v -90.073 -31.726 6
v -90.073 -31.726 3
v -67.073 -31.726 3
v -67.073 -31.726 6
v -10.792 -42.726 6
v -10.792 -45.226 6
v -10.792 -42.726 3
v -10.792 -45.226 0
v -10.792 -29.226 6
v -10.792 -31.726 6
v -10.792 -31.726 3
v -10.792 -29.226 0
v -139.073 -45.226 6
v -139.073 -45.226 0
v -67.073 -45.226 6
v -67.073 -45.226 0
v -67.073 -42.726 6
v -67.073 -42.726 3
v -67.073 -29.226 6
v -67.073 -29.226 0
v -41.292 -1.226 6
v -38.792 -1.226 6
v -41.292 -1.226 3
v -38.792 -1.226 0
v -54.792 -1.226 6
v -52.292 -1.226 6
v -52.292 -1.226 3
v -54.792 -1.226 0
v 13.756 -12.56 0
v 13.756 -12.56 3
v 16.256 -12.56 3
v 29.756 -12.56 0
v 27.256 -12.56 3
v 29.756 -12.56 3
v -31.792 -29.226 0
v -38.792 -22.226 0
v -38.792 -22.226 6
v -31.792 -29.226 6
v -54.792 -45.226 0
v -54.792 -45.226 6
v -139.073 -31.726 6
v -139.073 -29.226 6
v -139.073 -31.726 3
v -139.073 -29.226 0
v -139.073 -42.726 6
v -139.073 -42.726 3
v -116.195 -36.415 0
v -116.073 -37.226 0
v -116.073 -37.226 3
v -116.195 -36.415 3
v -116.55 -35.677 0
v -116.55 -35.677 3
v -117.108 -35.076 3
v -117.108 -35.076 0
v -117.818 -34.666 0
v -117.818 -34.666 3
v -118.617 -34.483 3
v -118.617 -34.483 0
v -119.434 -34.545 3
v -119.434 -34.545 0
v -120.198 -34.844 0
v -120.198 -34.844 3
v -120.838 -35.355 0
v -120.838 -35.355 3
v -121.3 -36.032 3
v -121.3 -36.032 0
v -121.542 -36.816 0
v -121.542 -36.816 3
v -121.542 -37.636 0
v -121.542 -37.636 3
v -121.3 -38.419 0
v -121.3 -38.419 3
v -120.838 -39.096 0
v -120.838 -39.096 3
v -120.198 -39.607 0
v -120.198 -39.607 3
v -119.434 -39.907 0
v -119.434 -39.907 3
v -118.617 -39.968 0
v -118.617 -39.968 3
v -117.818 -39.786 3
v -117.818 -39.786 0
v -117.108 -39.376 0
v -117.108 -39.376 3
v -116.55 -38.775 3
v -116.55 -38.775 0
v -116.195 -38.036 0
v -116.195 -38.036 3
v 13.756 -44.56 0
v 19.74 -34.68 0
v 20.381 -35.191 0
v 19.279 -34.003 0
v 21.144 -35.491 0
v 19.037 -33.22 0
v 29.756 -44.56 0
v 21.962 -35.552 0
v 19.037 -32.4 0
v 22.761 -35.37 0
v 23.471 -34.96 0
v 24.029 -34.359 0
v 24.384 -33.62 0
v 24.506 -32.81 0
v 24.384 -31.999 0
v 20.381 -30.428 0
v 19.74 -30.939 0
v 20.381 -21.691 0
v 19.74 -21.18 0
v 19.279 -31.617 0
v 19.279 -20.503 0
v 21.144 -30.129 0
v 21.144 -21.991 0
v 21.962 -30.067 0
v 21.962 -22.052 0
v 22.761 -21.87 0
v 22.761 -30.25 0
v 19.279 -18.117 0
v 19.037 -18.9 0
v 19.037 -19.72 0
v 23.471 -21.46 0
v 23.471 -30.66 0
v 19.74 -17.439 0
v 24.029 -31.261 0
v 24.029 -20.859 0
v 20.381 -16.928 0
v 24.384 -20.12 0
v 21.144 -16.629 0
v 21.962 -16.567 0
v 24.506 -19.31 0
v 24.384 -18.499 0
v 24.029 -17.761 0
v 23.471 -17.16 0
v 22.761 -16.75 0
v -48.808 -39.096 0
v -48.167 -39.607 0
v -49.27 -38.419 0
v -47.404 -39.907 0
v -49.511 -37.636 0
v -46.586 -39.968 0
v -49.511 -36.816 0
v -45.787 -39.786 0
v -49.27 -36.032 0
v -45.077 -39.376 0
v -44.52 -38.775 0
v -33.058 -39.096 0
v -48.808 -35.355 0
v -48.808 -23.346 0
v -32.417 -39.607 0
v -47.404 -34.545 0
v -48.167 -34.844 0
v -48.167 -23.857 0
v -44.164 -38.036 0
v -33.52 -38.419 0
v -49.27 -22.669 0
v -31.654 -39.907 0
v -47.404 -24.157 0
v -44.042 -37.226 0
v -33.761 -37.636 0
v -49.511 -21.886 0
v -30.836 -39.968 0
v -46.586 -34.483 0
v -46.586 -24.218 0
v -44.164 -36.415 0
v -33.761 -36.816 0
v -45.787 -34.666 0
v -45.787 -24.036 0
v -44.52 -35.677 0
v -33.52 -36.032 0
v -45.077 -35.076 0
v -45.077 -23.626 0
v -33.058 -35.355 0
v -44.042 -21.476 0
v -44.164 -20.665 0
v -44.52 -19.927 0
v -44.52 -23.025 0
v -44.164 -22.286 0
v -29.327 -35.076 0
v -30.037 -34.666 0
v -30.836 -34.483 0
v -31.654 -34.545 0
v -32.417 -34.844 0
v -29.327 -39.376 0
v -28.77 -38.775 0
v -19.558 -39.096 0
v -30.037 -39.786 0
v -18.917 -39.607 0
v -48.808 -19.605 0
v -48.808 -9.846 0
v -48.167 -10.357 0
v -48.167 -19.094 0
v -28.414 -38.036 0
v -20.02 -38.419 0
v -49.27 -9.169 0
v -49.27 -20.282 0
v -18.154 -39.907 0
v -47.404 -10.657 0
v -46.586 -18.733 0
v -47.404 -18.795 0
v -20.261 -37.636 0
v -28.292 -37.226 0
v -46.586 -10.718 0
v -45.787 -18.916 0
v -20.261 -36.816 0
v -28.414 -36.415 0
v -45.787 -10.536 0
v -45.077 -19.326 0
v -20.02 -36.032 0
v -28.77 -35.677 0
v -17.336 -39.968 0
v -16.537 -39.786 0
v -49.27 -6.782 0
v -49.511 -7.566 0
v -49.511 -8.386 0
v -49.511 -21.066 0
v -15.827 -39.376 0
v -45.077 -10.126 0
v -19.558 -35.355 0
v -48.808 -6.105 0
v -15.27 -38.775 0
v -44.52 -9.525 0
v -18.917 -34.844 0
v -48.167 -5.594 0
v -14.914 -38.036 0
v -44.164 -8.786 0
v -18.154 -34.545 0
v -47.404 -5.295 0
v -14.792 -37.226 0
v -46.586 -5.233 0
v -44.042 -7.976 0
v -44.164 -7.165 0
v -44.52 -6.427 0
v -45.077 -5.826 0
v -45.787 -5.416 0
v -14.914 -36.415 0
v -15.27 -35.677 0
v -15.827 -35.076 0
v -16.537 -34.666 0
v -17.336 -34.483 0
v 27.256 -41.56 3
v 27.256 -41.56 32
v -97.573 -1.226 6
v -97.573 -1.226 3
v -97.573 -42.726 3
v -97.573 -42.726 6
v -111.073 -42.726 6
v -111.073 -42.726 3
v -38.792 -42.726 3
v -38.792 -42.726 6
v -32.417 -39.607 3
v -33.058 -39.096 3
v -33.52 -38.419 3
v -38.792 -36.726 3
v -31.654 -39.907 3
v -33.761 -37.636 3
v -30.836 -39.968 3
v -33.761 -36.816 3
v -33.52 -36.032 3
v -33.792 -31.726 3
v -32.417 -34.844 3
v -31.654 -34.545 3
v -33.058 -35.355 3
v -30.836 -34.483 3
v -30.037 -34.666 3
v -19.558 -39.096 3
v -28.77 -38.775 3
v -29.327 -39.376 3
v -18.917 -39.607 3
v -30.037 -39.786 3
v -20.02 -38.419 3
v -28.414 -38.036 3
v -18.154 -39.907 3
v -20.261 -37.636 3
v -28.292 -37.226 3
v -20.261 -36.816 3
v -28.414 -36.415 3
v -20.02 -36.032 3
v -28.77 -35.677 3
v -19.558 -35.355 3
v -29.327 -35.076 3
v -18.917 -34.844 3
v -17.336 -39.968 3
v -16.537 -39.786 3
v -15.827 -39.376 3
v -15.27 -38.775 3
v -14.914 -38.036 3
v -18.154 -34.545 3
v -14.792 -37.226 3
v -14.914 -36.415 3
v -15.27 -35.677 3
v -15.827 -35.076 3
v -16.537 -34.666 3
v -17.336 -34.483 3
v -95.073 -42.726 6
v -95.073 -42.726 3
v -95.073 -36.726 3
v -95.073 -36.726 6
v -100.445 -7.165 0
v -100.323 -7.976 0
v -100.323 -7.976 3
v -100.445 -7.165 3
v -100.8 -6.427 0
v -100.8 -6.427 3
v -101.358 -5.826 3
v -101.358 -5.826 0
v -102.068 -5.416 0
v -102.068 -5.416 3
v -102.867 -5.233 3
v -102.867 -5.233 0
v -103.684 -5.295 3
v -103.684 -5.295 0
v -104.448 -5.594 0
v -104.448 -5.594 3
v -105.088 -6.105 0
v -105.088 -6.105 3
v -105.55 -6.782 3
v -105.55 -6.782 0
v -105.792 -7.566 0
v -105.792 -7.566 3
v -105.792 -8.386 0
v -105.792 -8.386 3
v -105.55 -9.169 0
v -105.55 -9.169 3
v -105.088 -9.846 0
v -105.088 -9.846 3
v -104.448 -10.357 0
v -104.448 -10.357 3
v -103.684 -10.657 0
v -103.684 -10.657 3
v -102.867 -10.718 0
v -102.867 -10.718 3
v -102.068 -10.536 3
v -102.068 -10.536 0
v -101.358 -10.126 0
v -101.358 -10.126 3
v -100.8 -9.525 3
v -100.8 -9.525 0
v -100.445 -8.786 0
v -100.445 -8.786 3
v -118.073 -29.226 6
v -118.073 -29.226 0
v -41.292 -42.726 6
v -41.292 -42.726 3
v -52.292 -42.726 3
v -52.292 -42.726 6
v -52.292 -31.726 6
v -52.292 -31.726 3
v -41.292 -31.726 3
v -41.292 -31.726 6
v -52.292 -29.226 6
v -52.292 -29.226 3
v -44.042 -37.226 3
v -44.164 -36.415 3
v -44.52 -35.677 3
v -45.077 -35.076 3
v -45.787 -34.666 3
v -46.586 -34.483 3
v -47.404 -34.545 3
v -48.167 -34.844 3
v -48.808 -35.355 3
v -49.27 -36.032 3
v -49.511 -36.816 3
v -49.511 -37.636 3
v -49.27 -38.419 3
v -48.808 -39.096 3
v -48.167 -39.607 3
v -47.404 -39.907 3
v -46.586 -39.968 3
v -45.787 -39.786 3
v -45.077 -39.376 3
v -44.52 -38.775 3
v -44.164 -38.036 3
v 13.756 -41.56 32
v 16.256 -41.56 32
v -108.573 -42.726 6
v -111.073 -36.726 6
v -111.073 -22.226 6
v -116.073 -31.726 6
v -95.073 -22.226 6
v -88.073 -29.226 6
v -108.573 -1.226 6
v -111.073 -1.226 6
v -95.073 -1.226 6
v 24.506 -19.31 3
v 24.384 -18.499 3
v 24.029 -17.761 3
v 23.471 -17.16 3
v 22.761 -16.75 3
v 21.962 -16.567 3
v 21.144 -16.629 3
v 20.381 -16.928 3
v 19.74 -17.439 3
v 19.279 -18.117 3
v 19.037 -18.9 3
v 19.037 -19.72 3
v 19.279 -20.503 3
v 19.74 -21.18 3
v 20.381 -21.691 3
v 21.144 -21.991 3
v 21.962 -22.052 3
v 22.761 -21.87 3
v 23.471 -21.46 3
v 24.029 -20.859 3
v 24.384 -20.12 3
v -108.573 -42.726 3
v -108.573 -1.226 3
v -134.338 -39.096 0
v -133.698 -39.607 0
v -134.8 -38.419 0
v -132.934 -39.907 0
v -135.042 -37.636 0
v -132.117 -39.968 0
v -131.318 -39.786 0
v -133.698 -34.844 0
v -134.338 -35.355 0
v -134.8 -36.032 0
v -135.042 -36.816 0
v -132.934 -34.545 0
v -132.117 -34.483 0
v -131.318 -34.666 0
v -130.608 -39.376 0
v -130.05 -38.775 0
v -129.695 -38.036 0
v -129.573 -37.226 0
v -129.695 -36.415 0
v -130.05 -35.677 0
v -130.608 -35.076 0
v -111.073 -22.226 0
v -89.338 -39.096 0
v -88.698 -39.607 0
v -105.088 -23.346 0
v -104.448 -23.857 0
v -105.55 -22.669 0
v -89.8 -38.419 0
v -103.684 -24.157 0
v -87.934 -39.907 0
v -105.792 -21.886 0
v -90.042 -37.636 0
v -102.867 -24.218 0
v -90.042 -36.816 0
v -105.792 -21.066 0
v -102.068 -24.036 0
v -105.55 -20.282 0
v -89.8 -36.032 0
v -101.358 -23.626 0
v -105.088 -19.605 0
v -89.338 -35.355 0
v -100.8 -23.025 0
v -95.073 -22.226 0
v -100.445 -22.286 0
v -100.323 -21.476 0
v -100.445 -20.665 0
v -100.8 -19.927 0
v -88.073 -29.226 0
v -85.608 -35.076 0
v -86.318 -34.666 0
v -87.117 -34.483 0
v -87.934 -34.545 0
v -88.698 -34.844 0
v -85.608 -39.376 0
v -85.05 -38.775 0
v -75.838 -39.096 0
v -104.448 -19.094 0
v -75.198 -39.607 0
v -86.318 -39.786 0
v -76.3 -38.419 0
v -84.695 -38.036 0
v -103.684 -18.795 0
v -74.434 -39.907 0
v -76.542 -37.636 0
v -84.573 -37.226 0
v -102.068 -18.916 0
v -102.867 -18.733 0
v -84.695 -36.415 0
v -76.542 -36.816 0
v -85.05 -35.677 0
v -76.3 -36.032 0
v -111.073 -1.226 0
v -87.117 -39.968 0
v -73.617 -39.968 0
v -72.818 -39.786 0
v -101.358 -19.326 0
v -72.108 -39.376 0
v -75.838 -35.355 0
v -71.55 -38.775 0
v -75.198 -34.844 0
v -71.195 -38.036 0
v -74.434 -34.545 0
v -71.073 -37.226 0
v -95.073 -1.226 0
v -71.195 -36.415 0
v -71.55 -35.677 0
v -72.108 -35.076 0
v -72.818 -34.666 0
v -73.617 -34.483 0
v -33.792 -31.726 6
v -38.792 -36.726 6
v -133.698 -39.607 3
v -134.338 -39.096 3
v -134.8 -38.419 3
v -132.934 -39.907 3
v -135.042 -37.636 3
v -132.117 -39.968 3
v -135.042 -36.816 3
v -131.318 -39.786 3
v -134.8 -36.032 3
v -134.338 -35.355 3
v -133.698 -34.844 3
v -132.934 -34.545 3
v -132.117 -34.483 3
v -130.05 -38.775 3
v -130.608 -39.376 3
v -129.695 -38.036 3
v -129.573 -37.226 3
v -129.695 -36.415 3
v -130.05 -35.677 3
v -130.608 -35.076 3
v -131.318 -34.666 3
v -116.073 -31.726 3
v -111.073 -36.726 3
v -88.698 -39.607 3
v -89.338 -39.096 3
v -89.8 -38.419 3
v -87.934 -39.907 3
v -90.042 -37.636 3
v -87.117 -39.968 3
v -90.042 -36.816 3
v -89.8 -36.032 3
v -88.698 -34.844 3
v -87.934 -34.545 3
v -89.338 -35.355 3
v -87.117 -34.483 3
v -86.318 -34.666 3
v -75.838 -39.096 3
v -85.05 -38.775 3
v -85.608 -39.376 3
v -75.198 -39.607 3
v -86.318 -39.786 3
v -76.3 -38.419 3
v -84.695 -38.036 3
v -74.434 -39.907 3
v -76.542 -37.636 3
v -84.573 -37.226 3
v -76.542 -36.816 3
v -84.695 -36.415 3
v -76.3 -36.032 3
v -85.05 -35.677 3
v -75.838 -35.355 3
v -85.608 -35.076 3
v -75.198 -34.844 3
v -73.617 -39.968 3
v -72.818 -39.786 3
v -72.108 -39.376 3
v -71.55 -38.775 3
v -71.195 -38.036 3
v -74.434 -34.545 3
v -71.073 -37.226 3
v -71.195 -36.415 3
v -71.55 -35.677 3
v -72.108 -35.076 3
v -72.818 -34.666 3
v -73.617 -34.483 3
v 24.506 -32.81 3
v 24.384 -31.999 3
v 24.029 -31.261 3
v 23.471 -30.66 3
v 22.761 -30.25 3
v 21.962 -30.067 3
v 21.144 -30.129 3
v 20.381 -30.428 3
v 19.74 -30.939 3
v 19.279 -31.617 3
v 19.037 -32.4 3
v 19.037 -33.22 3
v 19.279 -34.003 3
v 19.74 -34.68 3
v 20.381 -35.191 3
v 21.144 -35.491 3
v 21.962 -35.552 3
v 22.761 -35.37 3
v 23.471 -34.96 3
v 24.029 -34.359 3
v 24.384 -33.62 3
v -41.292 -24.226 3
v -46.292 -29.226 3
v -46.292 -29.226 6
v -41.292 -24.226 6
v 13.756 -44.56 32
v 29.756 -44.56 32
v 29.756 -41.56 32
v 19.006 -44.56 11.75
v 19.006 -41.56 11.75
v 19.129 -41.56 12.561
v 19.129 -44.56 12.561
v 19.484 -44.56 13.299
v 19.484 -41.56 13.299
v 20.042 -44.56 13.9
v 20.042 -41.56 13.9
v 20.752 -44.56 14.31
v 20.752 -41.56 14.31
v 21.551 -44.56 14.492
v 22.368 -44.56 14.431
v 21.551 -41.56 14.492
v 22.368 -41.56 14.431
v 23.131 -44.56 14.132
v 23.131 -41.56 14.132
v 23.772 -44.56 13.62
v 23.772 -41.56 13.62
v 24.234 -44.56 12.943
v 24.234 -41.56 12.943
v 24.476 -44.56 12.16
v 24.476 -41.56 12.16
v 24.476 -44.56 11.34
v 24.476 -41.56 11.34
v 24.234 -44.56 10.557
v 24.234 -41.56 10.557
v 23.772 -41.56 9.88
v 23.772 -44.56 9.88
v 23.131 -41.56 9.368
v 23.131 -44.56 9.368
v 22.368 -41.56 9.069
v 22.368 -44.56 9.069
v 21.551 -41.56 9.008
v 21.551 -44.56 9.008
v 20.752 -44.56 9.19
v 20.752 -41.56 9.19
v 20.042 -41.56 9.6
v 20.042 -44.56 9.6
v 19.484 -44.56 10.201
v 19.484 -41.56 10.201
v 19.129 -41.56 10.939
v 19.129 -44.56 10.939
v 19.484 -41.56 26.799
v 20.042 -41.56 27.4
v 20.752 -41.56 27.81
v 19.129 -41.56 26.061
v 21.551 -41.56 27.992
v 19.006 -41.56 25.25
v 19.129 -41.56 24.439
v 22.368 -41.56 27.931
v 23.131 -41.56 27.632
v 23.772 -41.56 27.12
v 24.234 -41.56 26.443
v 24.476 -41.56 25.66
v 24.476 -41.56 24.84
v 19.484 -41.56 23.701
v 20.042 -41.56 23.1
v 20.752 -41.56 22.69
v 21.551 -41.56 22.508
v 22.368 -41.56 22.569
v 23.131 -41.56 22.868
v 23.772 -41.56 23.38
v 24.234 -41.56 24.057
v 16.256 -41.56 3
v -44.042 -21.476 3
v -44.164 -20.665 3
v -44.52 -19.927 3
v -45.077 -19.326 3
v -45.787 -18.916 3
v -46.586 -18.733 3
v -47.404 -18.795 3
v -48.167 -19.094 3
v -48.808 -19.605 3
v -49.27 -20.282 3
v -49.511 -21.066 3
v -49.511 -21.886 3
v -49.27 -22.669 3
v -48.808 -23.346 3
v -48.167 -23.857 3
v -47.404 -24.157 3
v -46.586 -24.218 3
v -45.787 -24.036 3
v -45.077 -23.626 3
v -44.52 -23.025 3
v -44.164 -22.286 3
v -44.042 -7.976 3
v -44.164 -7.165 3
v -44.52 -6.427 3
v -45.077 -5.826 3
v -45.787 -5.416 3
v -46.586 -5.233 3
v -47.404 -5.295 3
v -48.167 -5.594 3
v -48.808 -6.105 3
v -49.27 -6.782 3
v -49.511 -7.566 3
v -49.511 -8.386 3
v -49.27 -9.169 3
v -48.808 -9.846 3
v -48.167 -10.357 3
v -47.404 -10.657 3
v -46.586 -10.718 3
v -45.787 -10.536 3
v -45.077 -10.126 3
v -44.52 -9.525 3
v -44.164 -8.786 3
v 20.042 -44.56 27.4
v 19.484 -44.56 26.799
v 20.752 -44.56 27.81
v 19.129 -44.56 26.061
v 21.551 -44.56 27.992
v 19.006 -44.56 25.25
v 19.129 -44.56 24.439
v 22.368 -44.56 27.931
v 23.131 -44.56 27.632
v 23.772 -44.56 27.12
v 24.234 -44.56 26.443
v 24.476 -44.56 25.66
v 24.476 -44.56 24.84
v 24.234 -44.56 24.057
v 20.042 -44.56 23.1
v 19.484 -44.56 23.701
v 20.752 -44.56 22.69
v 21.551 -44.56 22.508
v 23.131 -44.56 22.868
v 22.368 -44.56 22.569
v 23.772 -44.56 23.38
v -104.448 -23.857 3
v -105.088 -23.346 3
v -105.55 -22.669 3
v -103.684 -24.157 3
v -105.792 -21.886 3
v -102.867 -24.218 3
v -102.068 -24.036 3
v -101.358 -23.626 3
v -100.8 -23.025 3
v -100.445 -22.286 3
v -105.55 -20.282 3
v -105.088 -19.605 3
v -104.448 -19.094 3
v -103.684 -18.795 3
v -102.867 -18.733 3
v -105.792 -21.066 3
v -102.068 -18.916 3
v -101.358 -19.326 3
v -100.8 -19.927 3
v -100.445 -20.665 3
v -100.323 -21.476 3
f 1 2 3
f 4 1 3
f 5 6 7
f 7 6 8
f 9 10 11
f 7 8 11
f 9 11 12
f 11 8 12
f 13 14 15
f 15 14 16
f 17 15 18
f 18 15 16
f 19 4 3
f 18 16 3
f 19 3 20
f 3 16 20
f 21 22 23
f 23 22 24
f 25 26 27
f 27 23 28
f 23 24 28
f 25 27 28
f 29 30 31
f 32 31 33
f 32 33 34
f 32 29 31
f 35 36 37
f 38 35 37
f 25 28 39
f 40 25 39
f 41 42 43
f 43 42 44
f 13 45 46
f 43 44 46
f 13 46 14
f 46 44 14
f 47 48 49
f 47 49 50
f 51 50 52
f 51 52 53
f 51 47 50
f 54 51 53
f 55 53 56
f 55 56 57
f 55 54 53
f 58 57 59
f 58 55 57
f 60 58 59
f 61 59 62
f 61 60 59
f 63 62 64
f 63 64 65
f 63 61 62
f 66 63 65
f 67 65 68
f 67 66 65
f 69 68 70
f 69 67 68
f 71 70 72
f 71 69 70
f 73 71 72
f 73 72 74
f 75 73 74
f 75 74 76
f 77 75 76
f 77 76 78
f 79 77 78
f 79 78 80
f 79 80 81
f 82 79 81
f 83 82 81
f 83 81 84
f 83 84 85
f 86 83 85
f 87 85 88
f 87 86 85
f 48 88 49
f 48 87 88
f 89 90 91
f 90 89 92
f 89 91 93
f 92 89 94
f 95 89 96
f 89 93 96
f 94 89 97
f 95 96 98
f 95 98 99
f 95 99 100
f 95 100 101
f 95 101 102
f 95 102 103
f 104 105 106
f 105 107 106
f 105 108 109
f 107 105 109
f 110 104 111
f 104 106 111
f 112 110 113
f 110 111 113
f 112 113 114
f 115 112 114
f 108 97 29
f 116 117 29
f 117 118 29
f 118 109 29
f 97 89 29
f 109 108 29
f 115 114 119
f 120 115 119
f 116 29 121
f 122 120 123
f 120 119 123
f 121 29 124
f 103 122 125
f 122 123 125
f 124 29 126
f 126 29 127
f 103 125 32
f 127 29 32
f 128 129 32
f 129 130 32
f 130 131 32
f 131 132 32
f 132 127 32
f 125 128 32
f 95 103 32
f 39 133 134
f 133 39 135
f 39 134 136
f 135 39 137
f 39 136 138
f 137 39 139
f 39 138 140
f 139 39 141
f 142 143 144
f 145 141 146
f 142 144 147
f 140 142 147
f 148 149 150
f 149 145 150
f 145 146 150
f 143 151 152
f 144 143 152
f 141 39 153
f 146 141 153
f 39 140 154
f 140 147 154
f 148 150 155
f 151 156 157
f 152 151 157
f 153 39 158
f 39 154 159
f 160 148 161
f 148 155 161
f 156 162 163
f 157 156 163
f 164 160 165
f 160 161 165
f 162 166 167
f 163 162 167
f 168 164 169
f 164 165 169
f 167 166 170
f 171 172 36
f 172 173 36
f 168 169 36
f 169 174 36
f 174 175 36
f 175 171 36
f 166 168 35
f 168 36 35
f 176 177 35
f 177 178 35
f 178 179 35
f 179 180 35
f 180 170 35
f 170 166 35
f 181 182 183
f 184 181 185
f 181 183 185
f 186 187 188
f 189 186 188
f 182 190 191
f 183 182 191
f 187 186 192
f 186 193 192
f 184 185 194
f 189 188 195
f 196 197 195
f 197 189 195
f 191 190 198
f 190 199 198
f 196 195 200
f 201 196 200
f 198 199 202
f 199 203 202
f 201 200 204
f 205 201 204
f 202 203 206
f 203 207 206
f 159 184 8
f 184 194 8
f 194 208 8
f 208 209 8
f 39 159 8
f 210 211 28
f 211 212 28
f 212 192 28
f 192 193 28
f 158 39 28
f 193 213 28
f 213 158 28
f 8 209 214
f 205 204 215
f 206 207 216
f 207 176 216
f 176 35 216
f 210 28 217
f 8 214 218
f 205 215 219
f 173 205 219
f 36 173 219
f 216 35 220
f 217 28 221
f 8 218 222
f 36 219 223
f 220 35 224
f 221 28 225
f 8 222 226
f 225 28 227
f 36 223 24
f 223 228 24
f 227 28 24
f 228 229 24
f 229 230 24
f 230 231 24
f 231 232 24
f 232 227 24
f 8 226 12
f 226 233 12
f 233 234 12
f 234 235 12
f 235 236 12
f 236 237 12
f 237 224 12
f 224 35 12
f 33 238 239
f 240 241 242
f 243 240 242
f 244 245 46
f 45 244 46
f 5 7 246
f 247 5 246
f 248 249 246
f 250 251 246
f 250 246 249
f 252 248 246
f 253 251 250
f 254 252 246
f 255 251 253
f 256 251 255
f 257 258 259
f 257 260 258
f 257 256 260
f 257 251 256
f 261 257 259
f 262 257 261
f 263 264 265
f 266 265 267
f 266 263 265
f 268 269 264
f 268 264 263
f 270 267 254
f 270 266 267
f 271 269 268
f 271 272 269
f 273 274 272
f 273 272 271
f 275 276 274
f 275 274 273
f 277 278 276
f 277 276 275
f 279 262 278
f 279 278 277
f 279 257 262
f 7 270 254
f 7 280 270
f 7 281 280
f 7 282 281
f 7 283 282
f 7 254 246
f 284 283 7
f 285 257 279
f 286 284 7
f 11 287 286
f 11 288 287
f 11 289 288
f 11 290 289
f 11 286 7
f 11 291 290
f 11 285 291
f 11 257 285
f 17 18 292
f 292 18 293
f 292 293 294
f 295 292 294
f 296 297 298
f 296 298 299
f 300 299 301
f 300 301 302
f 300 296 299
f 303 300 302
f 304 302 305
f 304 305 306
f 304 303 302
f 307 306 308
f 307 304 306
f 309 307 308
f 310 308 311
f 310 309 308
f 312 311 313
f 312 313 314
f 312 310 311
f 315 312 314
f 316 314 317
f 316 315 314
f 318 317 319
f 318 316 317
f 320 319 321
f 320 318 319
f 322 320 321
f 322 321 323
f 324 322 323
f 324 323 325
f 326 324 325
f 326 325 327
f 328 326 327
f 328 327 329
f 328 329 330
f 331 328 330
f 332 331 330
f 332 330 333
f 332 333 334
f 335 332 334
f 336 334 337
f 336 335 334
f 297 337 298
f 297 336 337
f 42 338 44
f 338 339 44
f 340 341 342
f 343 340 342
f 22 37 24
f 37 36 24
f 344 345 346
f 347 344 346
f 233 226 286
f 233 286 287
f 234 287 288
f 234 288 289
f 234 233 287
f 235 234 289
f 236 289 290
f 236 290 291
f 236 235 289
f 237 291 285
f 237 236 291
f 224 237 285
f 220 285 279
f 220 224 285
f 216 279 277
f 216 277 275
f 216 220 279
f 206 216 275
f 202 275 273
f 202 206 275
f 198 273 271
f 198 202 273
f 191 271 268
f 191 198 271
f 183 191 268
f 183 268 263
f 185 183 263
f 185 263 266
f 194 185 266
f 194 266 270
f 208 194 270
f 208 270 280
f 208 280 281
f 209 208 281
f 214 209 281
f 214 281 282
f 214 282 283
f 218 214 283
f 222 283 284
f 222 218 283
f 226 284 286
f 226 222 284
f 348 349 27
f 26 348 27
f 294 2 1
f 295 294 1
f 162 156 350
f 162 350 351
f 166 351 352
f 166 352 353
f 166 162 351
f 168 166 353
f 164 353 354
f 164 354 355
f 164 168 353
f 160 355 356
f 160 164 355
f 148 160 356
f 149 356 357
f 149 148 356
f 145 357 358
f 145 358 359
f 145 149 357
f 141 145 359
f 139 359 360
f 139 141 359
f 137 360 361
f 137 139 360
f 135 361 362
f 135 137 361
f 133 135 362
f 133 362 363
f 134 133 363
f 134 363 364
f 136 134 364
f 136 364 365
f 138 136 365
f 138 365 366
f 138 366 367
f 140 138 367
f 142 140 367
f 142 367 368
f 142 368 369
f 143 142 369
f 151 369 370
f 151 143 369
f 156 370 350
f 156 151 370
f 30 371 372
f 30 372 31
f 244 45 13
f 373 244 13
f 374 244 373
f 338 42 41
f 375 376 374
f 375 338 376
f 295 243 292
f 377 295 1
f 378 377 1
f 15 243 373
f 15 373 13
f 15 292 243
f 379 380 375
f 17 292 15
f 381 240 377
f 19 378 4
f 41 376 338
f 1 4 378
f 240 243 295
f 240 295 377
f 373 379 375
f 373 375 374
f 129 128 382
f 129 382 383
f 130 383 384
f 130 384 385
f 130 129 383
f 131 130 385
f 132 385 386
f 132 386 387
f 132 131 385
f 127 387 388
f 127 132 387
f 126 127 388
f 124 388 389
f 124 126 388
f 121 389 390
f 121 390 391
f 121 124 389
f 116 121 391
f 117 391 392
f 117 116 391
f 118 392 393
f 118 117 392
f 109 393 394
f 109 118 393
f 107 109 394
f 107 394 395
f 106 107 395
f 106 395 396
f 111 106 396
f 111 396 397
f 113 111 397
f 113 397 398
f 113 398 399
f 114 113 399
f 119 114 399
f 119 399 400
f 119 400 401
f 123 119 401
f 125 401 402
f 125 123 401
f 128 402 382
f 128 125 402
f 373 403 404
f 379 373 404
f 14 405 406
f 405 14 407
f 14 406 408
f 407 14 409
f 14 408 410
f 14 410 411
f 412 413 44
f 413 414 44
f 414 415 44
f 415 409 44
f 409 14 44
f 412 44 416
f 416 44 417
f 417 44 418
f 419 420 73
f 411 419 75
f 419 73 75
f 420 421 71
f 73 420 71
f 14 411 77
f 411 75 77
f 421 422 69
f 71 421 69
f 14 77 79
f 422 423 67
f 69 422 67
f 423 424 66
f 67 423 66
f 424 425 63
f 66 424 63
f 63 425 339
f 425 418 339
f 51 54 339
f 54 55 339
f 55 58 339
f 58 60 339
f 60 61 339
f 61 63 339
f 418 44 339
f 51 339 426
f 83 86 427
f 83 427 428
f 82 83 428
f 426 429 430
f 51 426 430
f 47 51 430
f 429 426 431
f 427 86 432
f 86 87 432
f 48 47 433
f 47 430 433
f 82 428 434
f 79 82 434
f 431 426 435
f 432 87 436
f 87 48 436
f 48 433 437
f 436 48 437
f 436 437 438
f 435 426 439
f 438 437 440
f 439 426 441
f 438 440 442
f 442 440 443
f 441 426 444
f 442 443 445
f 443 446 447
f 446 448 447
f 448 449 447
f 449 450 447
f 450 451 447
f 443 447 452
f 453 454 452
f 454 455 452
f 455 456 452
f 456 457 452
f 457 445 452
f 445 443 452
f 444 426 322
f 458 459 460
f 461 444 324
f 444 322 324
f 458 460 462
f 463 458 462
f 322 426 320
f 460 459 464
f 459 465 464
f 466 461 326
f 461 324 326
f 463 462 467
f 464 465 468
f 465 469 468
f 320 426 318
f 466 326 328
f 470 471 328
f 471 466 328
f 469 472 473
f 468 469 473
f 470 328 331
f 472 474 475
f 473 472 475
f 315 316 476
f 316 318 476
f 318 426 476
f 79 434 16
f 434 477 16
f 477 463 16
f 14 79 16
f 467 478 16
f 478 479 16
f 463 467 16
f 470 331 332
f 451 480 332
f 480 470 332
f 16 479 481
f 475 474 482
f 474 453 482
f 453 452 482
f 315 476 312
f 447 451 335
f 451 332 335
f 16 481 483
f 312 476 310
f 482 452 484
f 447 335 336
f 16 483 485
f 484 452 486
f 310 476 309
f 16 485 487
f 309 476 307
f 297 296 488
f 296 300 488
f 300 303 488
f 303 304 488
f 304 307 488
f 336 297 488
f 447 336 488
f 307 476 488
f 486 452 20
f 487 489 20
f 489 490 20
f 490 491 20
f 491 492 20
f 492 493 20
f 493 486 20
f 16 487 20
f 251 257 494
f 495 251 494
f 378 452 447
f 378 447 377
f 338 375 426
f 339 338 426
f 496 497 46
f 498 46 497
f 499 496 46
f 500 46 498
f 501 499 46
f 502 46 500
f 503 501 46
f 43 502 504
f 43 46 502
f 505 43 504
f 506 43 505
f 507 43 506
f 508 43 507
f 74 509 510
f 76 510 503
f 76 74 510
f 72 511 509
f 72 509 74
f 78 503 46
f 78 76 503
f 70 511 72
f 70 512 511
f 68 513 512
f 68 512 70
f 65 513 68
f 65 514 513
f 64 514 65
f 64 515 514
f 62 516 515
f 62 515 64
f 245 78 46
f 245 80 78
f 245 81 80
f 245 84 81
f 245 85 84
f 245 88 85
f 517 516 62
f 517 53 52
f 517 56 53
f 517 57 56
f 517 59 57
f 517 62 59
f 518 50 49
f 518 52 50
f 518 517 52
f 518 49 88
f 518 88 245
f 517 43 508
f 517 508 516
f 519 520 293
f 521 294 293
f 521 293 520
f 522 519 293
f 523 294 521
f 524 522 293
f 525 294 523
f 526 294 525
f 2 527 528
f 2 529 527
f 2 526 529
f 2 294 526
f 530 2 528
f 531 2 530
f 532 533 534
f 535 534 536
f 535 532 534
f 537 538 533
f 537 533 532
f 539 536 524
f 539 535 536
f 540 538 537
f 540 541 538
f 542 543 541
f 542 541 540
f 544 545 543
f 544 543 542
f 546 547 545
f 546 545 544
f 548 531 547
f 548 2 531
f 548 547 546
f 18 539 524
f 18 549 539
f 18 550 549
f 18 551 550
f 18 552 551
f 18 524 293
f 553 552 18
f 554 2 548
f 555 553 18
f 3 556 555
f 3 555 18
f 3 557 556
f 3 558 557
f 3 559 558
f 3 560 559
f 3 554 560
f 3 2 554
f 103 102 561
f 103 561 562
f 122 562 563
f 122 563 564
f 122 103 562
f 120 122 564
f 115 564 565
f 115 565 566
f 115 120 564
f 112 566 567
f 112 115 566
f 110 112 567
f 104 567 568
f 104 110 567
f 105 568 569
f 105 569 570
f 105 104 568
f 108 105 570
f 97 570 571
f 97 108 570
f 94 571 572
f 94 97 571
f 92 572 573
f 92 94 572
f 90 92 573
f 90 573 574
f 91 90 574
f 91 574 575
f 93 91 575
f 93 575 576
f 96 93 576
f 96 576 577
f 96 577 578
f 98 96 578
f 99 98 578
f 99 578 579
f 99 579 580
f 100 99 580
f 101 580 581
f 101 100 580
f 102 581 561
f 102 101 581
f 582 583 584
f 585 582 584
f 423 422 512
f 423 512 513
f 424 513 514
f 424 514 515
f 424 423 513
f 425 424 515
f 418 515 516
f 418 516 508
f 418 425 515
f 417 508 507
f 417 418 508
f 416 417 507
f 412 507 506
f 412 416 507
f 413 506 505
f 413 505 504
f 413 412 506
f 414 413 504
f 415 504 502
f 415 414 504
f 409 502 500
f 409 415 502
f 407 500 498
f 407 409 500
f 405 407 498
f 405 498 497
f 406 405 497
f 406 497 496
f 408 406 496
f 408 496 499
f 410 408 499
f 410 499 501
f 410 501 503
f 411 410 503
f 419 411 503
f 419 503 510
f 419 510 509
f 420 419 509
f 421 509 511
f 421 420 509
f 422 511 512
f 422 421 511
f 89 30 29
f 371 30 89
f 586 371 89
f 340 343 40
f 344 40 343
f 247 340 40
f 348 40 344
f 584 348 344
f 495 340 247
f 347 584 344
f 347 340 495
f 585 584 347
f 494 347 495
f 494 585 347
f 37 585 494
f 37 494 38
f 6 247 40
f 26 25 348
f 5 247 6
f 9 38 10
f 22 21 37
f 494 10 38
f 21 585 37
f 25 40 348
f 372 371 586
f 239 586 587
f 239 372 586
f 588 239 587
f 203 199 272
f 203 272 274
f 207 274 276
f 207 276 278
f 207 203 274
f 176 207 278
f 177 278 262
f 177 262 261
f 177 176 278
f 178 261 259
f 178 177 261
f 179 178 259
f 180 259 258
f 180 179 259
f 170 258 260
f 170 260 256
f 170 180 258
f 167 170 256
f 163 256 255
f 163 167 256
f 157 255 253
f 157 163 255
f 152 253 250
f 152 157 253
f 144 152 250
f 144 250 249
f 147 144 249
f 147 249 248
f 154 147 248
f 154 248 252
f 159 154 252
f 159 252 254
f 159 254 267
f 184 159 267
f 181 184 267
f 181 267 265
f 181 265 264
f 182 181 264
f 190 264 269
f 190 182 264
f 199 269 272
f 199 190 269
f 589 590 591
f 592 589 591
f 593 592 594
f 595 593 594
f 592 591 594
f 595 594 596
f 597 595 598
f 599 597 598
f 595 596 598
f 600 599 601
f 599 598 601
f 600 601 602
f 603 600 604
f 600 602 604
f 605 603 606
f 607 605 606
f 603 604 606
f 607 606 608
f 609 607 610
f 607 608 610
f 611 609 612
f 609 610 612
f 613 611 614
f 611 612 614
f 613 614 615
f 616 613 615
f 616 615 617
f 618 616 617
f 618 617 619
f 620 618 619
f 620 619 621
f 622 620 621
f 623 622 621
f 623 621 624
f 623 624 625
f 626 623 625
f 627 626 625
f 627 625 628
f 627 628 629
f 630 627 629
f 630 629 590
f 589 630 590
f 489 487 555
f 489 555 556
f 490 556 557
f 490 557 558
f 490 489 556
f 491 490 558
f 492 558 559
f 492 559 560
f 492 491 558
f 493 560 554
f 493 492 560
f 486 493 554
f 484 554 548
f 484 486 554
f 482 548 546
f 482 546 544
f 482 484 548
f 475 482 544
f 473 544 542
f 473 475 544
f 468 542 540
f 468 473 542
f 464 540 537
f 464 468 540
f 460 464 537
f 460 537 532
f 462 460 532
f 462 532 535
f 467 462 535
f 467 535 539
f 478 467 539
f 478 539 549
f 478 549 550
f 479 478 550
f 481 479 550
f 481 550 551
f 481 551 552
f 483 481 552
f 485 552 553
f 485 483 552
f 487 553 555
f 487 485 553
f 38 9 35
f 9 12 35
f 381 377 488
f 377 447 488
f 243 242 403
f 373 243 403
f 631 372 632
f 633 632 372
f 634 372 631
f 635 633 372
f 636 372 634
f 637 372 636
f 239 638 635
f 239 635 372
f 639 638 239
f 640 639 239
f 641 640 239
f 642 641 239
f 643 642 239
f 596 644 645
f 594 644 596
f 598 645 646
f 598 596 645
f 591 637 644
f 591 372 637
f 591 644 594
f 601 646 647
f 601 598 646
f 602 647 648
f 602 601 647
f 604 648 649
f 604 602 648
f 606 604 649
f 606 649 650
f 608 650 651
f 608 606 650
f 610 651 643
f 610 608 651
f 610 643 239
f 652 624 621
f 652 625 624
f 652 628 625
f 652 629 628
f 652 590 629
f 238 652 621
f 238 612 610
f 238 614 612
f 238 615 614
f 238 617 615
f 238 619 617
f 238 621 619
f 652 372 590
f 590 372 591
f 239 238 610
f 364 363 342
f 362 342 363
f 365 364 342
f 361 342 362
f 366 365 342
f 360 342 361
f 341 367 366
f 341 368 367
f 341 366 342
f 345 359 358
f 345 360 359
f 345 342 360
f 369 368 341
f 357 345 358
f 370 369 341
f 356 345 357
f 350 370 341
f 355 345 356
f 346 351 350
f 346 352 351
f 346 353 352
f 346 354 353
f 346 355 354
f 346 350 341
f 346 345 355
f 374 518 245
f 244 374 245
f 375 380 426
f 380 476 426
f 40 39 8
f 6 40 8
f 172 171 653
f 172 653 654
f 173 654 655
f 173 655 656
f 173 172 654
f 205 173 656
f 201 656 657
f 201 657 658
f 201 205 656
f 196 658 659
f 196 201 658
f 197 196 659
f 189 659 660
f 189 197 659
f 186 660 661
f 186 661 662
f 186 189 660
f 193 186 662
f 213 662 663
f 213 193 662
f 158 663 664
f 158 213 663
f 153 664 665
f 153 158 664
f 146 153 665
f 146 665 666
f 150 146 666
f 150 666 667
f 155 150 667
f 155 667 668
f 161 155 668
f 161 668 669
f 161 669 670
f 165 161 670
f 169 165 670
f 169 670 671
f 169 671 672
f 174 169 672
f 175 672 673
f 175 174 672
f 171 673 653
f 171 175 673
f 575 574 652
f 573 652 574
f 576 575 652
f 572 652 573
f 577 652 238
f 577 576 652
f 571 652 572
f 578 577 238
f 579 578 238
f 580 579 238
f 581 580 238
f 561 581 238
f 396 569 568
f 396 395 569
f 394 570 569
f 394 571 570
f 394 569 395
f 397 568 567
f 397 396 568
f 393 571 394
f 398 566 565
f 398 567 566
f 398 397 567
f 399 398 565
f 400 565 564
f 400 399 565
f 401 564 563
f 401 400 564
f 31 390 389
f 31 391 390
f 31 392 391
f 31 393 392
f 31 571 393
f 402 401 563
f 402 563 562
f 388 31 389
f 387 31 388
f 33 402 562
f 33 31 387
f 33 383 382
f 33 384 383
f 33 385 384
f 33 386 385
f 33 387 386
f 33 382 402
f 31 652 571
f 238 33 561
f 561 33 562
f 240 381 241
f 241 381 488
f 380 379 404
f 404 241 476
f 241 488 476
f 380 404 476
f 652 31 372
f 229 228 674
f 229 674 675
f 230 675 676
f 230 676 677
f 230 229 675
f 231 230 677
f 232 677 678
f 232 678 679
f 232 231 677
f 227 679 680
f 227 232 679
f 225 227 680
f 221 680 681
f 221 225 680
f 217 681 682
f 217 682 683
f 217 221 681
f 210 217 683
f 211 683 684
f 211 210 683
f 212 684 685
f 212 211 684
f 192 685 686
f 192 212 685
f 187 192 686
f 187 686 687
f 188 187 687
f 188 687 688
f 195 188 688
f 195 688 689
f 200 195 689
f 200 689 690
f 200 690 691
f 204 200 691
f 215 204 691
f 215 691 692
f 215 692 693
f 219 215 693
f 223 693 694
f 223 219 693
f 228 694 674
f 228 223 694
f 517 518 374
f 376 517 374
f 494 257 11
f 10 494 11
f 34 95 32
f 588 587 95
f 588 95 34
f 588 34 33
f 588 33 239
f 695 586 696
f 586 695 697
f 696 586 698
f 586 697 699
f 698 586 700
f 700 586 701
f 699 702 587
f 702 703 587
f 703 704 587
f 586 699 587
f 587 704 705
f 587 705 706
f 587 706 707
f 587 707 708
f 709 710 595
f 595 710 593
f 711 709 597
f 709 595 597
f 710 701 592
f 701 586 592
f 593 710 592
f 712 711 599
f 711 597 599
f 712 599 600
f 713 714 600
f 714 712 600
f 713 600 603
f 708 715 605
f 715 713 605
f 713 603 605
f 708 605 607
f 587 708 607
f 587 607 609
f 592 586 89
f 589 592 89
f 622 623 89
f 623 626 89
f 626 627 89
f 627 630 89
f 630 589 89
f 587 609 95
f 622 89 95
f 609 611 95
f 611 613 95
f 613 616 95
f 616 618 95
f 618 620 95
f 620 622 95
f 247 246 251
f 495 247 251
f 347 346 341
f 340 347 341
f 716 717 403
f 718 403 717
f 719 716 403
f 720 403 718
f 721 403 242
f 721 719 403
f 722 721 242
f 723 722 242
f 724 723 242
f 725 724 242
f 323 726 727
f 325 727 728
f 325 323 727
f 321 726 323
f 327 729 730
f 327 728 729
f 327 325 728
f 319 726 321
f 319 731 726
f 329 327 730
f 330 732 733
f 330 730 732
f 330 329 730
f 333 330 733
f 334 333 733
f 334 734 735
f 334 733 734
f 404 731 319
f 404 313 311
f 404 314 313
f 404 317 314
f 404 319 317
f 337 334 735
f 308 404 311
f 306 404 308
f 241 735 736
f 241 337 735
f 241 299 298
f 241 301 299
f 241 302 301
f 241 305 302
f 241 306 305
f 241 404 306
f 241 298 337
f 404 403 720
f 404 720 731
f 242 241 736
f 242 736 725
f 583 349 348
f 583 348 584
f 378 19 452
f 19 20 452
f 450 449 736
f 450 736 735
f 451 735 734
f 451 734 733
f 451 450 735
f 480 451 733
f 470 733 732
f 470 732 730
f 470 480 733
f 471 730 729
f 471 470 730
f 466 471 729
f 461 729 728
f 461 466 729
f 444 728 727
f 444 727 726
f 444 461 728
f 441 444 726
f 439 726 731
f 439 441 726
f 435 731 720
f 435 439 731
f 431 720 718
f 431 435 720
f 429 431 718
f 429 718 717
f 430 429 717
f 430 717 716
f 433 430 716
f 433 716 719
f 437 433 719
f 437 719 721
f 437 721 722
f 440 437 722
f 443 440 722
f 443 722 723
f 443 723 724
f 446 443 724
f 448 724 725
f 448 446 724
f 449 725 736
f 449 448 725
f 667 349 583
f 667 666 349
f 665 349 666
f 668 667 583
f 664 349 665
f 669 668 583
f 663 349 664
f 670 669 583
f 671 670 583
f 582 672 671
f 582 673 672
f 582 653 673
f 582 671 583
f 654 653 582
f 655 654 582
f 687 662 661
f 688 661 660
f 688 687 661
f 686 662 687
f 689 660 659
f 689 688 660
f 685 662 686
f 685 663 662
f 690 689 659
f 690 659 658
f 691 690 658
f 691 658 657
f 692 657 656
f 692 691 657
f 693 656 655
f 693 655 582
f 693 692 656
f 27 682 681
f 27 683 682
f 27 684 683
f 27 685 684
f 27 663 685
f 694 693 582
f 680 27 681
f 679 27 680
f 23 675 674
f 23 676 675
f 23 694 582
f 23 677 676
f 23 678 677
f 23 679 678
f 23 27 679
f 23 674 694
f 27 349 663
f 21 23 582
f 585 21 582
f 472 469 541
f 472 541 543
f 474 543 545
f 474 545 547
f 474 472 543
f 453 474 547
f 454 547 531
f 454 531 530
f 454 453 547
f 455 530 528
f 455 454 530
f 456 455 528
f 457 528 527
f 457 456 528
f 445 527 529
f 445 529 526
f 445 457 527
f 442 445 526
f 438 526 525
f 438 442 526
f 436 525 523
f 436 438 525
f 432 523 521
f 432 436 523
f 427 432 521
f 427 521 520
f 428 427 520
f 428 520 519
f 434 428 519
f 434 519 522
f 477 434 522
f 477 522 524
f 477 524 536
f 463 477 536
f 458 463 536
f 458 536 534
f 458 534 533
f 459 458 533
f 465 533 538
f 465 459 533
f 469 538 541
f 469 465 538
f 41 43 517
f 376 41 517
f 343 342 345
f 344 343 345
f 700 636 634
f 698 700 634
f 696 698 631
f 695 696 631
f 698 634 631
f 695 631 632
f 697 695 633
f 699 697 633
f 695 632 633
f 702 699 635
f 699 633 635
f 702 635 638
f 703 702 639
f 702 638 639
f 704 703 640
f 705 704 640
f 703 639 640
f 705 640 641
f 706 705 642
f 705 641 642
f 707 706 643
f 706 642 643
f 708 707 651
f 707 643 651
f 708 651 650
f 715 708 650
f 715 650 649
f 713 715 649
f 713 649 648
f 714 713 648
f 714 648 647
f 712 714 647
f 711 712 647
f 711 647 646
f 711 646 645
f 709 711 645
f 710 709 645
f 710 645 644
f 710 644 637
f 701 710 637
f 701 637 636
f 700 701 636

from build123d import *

# Parameters (mm, degrees)
F0_R      = 2.75
F0_W      = 16
F0_H      = 32
F1_DEPTH  = 3
F2_W      = 2.5
F2_H      = 11
F2_W_2    = 11
F2_H_2    = 2.5
F3_DEPTH  = 3
F4_SIZE   = 7
F5_SIZE   = 5
F6_W      = 16
F6_H      = 3
F7_DEPTH  = 29
F8_R      = 2.75
F9_DEPTH  = 25
F11_DEPTH = 2.5
F13_DEPTH = 2.5


with BuildPart() as f1:
    # F0 (on Top) → F1 (new body)
    with BuildSketch(Plane.XY):
        Polygon((-54.791841, -1.225647), (-54.791841, -45.225647), (-10.791841, -45.225647), (-10.791841, -29.225647), (-38.791841, -29.225647), (-38.791841, -1.225647), align=None)
        with Locations((-46.791841, -37.225647)):
            Circle(F0_R, mode=Mode.SUBTRACT)
        with Locations((-31.041841, -37.225647)):
            Circle(F0_R, mode=Mode.SUBTRACT)
        with Locations((-17.541841, -37.225647)):
            Circle(F0_R, mode=Mode.SUBTRACT)
        with Locations((-46.791841, -21.475647)):
            Circle(F0_R, mode=Mode.SUBTRACT)
        with Locations((-46.791841, -7.975647)):
            Circle(F0_R, mode=Mode.SUBTRACT)
        Polygon((-139.072529, -45.225647), (-67.072529, -45.225647), (-67.072529, -29.225647), (-95.072529, -29.225647), (-95.072529, -1.225647), (-111.072529, -1.225647), (-111.072529, -29.225647), (-139.072529, -29.225647), align=None)
        with Locations((-132.322529, -37.225647)):
            Circle(F0_R, mode=Mode.SUBTRACT)
        with Locations((-118.822529, -37.225647)):
            Circle(F0_R, mode=Mode.SUBTRACT)
        with Locations((-87.322529, -37.225647)):
            Circle(F0_R, mode=Mode.SUBTRACT)
        with Locations((-73.822529, -37.225647)):
            Circle(F0_R, mode=Mode.SUBTRACT)
        with Locations((-103.072529, -21.475647)):
            Circle(F0_R, mode=Mode.SUBTRACT)
        with Locations((-103.072529, -7.975647)):
            Circle(F0_R, mode=Mode.SUBTRACT)
        with Locations((21.756346, -28.559807)):
            Rectangle(F0_W, F0_H)
        with Locations((21.756346, -32.809807)):
            Circle(F0_R, mode=Mode.SUBTRACT)
        with Locations((21.756346, -19.309807)):
            Circle(F0_R, mode=Mode.SUBTRACT)
    extrude(amount=F1_DEPTH)

    # F2 (on face) → F3 (join)
    with BuildSketch(Plane.XY.offset(3)):
        Polygon((-54.791841, -45.225647), (-10.791841, -45.225647), (-10.791841, -42.725647), (-38.791841, -42.725647), (-41.291841, -42.725647), (-52.291841, -42.725647), (-52.291841, -31.725647), (-52.291841, -29.225647), (-52.291841, -1.225647), (-54.791841, -1.225647), align=None)
        with Locations((-40.041841, -37.225647)):
            Rectangle(F2_W, F2_H)
        Polygon((-41.291841, -31.725647), (-38.791841, -31.725647), (-10.791841, -31.725647), (-10.791841, -29.225647), (-38.791841, -29.225647), (-38.791841, -1.225647), (-41.291841, -1.225647), (-41.291841, -29.225647), align=None)
        with Locations((-46.791841, -30.475647)):
            Rectangle(F2_W_2, F2_H_2)
        Polygon((-111.072529, -29.225647), (-139.072529, -29.225647), (-139.072529, -31.725647), (-111.072529, -31.725647), (-111.072529, -42.725647), (-108.572529, -42.725647), (-108.572529, -1.225647), (-111.072529, -1.225647), align=None)
        Polygon((-108.572529, -42.725647), (-111.072529, -42.725647), (-139.072529, -42.725647), (-139.072529, -45.225647), (-67.072529, -45.225647), (-67.072529, -42.725647), (-95.072529, -42.725647), (-97.572529, -42.725647), align=None)
        Polygon((-97.572529, -1.225647), (-97.572529, -42.725647), (-95.072529, -42.725647), (-95.072529, -31.725647), (-67.072529, -31.725647), (-67.072529, -29.225647), (-95.072529, -29.225647), (-95.072529, -1.225647), align=None)
    extrude(amount=F3_DEPTH)

    # F4
    f4_edges = [f1.edges().sort_by_distance(p)[0] for p in [
        (-95.072529, -29.225647, 3),
        (-38.791841, -29.225647, 3),
        (-111.072529, -29.225647, 3),
    ]]
    chamfer(f4_edges, length=F4_SIZE)

    # F5
    f5_edges = [f1.edges().sort_by_distance(p)[0] for p in [
        (-95.072529, -31.725647, 4.5),
        (-38.791841, -31.725647, 4.5),
        (-111.072529, -31.725647, 4.5),
        (-41.291841, -29.225647, 4.5),
    ]]
    chamfer(f5_edges, length=F5_SIZE)

    # F6 (on face) → F7 (join)
    with BuildSketch(Plane.XY.offset(3)):
        with Locations((21.756346, -43.059807)):
            Rectangle(F6_W, F6_H)
    extrude(amount=F7_DEPTH)

    # F8 (on face) → F9 (cut)
    with BuildSketch(Plane(origin=(0, -41.559807, 0), x_dir=(-1, 0, 0), z_dir=(0, 1, 0))):
        with Locations((-21.756346, 25.25)):
            Circle(F8_R)
        with Locations((-21.756346, 11.75)):
            Circle(F8_R)
    extrude(amount=-F9_DEPTH, mode=Mode.SUBTRACT)

    # F10 (on face) → F11 (join)
    with BuildSketch(Plane.YZ.offset(29.756346)):
        Polygon((-12.559807, 3), (-41.559807, 32), (-41.559807, 3), align=None)
    extrude(amount=-F11_DEPTH)

    # F12 (on face) → F13 (join)
    with BuildSketch(Plane(origin=(13.756346, 0, 0), x_dir=(0, -1, 0), z_dir=(-1, 0, 0))):
        Polygon((12.559807, 3), (41.559807, 3), (41.559807, 32), align=None)
    extrude(amount=-F13_DEPTH)


solid = f1.part
